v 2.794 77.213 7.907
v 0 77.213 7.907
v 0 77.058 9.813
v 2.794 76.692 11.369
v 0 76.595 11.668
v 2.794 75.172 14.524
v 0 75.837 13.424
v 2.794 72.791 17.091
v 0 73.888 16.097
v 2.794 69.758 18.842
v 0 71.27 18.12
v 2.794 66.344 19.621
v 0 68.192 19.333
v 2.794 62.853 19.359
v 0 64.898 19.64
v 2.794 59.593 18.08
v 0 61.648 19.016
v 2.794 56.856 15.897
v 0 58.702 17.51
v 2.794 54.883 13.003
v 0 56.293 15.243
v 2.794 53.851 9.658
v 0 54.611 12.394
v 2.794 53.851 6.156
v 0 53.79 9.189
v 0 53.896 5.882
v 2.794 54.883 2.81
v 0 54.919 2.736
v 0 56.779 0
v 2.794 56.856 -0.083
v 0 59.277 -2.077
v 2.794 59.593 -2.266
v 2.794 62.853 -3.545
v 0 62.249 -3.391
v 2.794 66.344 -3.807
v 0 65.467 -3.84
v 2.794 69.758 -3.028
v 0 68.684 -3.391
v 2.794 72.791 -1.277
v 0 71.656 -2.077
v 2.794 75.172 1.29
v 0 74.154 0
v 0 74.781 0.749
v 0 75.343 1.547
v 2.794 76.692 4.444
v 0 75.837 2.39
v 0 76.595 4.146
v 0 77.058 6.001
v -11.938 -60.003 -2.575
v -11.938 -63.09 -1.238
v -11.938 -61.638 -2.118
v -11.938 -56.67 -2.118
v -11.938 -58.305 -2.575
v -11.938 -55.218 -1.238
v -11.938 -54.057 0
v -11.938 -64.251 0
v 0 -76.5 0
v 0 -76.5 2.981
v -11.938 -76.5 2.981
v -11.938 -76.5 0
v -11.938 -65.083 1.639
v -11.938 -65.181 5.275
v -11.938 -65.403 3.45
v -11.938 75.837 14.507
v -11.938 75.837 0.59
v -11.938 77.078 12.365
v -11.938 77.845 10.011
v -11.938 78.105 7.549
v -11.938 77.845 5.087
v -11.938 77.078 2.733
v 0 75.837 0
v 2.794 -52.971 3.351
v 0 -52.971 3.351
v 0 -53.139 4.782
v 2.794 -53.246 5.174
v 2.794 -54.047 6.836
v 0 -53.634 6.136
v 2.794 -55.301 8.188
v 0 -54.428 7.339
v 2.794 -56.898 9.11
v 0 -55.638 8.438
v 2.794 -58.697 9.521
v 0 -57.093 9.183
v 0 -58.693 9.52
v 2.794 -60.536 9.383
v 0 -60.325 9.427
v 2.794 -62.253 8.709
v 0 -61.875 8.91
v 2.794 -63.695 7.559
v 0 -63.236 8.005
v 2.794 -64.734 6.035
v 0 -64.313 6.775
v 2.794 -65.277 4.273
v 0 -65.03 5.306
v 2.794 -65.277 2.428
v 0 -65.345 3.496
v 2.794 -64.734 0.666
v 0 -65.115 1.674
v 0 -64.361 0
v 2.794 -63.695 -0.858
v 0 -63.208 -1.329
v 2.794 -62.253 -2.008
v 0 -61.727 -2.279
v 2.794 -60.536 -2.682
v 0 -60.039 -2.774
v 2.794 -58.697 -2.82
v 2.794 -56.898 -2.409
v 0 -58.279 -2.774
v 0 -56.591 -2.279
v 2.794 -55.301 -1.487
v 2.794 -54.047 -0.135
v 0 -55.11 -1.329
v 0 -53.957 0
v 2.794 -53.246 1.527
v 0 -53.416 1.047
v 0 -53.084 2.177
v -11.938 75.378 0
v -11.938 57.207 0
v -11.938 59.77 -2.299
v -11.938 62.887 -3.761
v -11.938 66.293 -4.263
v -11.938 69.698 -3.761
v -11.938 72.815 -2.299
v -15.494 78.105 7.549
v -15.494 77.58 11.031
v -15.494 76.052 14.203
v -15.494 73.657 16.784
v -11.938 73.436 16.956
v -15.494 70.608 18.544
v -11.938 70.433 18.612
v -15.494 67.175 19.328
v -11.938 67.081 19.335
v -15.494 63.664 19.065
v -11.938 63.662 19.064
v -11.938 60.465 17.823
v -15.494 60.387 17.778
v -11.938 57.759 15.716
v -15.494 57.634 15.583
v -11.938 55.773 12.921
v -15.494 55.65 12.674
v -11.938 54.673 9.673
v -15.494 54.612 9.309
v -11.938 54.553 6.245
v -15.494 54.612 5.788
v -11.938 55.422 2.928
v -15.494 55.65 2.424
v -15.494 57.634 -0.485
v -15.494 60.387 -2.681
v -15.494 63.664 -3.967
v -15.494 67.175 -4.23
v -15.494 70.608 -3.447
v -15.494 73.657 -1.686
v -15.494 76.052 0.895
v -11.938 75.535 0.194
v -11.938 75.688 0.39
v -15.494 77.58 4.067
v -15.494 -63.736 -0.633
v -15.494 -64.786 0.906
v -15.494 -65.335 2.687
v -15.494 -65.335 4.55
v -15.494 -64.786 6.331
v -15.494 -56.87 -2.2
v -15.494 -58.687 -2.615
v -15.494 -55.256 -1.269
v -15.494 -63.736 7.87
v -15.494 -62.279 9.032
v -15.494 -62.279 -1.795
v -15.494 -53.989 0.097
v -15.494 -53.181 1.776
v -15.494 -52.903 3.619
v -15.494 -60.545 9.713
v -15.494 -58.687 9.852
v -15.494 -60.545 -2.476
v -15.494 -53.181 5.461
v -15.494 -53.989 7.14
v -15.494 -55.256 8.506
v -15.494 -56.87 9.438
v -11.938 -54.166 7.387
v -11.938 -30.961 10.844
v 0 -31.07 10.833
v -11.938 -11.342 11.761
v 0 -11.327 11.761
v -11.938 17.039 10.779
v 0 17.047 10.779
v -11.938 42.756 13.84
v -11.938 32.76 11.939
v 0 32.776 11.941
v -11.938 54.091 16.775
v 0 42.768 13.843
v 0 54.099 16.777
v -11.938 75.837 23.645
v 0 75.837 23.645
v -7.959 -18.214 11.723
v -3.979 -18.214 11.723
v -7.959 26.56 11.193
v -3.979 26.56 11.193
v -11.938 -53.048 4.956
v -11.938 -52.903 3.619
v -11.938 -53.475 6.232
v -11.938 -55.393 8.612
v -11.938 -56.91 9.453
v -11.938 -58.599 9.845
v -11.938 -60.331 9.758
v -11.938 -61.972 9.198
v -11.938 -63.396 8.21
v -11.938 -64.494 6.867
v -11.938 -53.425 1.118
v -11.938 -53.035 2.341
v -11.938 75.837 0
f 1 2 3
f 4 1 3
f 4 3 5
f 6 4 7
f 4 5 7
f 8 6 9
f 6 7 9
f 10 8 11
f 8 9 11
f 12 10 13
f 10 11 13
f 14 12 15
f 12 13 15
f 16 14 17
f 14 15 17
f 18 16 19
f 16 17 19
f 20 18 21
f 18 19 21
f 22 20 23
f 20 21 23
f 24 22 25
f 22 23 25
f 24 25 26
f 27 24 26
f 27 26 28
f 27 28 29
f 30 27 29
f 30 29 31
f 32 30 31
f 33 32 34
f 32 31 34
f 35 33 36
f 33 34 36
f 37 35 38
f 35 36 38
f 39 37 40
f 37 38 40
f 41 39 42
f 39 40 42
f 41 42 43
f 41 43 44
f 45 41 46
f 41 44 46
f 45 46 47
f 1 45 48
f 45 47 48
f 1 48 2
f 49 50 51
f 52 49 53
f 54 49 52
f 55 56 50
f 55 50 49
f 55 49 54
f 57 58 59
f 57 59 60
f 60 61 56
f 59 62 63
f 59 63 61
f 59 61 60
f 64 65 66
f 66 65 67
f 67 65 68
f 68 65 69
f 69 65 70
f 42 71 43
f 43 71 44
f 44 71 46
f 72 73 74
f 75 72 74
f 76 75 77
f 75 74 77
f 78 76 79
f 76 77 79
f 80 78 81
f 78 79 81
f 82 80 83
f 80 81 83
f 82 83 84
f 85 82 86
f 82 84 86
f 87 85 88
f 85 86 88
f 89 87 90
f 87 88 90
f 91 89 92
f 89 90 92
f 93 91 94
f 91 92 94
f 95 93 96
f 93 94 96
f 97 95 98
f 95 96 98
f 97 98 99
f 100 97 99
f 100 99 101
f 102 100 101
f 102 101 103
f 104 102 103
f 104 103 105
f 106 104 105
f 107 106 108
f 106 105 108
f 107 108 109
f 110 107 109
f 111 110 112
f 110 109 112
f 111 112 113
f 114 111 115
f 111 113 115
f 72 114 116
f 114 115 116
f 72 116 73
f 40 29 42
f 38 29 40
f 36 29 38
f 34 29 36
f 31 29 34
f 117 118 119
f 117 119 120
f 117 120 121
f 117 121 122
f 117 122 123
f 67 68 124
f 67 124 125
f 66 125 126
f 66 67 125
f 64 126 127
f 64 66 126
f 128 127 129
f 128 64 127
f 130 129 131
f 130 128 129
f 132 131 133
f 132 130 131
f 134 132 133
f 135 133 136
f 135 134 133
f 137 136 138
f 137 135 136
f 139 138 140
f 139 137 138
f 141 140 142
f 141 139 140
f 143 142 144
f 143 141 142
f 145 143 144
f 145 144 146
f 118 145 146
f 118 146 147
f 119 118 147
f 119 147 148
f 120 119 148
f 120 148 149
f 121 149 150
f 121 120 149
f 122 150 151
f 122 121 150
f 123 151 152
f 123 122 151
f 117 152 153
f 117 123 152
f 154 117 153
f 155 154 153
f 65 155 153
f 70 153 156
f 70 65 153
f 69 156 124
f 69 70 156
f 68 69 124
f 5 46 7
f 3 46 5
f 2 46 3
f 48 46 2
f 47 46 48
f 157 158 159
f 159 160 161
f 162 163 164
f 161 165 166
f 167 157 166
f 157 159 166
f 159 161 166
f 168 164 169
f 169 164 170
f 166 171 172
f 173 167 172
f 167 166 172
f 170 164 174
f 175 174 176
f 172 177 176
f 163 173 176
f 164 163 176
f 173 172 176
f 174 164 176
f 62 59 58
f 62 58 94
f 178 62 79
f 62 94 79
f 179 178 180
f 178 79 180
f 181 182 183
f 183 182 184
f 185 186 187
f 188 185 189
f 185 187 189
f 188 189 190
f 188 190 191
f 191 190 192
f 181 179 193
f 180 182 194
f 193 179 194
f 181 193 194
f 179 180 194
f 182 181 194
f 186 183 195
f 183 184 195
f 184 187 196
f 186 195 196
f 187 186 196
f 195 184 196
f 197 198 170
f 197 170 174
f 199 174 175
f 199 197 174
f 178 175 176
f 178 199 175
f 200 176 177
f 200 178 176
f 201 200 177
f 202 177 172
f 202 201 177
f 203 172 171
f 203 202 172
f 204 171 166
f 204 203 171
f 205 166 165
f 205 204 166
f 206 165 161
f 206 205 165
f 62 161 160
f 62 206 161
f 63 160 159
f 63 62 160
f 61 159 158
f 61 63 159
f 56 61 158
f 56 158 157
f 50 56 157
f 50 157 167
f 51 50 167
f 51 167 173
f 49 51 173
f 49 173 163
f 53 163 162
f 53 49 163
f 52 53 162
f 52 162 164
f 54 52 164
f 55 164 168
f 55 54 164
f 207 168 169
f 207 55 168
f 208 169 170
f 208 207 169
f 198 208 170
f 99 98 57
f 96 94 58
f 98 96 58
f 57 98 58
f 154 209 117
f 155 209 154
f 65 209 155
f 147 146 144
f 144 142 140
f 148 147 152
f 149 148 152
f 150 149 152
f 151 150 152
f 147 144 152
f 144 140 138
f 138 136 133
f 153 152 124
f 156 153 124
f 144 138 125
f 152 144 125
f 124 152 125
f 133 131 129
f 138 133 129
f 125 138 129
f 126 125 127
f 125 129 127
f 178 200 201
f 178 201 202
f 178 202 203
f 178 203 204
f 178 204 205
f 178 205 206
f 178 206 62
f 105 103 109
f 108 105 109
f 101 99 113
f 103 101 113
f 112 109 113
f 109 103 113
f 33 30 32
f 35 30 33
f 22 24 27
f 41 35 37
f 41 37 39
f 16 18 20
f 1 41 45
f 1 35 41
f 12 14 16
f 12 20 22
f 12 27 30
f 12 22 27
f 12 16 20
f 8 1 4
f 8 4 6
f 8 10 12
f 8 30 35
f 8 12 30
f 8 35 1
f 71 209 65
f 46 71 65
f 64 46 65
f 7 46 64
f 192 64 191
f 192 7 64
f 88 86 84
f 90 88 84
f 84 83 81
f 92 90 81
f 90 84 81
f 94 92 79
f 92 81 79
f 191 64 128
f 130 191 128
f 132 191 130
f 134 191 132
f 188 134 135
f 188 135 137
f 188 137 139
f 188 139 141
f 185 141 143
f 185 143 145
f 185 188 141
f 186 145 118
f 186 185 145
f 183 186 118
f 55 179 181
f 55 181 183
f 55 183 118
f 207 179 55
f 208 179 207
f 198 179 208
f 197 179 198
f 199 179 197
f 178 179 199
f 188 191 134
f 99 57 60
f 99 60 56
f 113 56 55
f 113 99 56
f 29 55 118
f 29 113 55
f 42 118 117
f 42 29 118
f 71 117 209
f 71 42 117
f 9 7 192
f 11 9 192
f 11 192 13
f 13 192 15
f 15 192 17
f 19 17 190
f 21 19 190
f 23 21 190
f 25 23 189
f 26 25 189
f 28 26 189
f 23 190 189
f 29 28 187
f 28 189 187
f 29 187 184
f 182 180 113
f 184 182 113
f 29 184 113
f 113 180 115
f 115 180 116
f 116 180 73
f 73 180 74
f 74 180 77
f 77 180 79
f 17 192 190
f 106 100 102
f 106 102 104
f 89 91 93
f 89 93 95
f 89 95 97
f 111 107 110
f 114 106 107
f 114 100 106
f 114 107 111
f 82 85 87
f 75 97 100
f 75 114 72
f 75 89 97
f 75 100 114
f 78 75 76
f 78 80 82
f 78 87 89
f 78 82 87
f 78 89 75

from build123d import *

# Parameters (mm, degrees)
F1_DEPTH = 11.938
F2_R     = 6.1875403552
F2_R_2   = 11.7467600062
F3_DEPTH = 2.794
F5_R     = 11.8120539401
F5_R_2   = 6.2510630266
F6_DEPTH = 3.556


with BuildPart() as f1:
    # F0 (on Right) → F1 (new body)
    with BuildSketch(Plane.YZ):
        with BuildLine():
            add(Edge.make_bspline(
                [(-76.4996260405, 2.9805048835), (-56.3796152142, 7.097398258), (-18.7224302831, 14.8026930756), (26.7459462387, 7.4220428779), (59.1316162883, 18.1245890634), (75.8372917771, 23.6453413963)],
                knots=[0, 0, 0, 0, 0.3571080314, 0.6683735558, 1, 1, 1, 1], degree=3))
            Line((-76.4996260405, 2.9805048835), (-76.4996260405, 0))
            Line((-76.4996260405, 0), (75.8372917771, 0))
            Line((75.8372917771, 0), (75.8372917771, 23.6453413963))
        make_face()
    extrude(amount=-F1_DEPTH)

    # F2 (on Right) → F3 (join)
    with BuildSketch(Plane.YZ):
        with Locations((-59.1590069234, 3.350545885)):
            Circle(F2_R)
        with Locations((65.4666498303, 7.9067526385)):
            Circle(F2_R_2)
    extrude(amount=F3_DEPTH)

    # F5 (on offset) → F6 (join)
    with BuildSketch(Plane.YZ.offset(-11.938)):
        with Locations((66.2925317883, 7.5488621369)):
            Circle(F5_R)
        with Locations((-59.1539330781, 3.6185581703)):
            Circle(F5_R_2)
    extrude(amount=-F6_DEPTH)


solid = f1.part
